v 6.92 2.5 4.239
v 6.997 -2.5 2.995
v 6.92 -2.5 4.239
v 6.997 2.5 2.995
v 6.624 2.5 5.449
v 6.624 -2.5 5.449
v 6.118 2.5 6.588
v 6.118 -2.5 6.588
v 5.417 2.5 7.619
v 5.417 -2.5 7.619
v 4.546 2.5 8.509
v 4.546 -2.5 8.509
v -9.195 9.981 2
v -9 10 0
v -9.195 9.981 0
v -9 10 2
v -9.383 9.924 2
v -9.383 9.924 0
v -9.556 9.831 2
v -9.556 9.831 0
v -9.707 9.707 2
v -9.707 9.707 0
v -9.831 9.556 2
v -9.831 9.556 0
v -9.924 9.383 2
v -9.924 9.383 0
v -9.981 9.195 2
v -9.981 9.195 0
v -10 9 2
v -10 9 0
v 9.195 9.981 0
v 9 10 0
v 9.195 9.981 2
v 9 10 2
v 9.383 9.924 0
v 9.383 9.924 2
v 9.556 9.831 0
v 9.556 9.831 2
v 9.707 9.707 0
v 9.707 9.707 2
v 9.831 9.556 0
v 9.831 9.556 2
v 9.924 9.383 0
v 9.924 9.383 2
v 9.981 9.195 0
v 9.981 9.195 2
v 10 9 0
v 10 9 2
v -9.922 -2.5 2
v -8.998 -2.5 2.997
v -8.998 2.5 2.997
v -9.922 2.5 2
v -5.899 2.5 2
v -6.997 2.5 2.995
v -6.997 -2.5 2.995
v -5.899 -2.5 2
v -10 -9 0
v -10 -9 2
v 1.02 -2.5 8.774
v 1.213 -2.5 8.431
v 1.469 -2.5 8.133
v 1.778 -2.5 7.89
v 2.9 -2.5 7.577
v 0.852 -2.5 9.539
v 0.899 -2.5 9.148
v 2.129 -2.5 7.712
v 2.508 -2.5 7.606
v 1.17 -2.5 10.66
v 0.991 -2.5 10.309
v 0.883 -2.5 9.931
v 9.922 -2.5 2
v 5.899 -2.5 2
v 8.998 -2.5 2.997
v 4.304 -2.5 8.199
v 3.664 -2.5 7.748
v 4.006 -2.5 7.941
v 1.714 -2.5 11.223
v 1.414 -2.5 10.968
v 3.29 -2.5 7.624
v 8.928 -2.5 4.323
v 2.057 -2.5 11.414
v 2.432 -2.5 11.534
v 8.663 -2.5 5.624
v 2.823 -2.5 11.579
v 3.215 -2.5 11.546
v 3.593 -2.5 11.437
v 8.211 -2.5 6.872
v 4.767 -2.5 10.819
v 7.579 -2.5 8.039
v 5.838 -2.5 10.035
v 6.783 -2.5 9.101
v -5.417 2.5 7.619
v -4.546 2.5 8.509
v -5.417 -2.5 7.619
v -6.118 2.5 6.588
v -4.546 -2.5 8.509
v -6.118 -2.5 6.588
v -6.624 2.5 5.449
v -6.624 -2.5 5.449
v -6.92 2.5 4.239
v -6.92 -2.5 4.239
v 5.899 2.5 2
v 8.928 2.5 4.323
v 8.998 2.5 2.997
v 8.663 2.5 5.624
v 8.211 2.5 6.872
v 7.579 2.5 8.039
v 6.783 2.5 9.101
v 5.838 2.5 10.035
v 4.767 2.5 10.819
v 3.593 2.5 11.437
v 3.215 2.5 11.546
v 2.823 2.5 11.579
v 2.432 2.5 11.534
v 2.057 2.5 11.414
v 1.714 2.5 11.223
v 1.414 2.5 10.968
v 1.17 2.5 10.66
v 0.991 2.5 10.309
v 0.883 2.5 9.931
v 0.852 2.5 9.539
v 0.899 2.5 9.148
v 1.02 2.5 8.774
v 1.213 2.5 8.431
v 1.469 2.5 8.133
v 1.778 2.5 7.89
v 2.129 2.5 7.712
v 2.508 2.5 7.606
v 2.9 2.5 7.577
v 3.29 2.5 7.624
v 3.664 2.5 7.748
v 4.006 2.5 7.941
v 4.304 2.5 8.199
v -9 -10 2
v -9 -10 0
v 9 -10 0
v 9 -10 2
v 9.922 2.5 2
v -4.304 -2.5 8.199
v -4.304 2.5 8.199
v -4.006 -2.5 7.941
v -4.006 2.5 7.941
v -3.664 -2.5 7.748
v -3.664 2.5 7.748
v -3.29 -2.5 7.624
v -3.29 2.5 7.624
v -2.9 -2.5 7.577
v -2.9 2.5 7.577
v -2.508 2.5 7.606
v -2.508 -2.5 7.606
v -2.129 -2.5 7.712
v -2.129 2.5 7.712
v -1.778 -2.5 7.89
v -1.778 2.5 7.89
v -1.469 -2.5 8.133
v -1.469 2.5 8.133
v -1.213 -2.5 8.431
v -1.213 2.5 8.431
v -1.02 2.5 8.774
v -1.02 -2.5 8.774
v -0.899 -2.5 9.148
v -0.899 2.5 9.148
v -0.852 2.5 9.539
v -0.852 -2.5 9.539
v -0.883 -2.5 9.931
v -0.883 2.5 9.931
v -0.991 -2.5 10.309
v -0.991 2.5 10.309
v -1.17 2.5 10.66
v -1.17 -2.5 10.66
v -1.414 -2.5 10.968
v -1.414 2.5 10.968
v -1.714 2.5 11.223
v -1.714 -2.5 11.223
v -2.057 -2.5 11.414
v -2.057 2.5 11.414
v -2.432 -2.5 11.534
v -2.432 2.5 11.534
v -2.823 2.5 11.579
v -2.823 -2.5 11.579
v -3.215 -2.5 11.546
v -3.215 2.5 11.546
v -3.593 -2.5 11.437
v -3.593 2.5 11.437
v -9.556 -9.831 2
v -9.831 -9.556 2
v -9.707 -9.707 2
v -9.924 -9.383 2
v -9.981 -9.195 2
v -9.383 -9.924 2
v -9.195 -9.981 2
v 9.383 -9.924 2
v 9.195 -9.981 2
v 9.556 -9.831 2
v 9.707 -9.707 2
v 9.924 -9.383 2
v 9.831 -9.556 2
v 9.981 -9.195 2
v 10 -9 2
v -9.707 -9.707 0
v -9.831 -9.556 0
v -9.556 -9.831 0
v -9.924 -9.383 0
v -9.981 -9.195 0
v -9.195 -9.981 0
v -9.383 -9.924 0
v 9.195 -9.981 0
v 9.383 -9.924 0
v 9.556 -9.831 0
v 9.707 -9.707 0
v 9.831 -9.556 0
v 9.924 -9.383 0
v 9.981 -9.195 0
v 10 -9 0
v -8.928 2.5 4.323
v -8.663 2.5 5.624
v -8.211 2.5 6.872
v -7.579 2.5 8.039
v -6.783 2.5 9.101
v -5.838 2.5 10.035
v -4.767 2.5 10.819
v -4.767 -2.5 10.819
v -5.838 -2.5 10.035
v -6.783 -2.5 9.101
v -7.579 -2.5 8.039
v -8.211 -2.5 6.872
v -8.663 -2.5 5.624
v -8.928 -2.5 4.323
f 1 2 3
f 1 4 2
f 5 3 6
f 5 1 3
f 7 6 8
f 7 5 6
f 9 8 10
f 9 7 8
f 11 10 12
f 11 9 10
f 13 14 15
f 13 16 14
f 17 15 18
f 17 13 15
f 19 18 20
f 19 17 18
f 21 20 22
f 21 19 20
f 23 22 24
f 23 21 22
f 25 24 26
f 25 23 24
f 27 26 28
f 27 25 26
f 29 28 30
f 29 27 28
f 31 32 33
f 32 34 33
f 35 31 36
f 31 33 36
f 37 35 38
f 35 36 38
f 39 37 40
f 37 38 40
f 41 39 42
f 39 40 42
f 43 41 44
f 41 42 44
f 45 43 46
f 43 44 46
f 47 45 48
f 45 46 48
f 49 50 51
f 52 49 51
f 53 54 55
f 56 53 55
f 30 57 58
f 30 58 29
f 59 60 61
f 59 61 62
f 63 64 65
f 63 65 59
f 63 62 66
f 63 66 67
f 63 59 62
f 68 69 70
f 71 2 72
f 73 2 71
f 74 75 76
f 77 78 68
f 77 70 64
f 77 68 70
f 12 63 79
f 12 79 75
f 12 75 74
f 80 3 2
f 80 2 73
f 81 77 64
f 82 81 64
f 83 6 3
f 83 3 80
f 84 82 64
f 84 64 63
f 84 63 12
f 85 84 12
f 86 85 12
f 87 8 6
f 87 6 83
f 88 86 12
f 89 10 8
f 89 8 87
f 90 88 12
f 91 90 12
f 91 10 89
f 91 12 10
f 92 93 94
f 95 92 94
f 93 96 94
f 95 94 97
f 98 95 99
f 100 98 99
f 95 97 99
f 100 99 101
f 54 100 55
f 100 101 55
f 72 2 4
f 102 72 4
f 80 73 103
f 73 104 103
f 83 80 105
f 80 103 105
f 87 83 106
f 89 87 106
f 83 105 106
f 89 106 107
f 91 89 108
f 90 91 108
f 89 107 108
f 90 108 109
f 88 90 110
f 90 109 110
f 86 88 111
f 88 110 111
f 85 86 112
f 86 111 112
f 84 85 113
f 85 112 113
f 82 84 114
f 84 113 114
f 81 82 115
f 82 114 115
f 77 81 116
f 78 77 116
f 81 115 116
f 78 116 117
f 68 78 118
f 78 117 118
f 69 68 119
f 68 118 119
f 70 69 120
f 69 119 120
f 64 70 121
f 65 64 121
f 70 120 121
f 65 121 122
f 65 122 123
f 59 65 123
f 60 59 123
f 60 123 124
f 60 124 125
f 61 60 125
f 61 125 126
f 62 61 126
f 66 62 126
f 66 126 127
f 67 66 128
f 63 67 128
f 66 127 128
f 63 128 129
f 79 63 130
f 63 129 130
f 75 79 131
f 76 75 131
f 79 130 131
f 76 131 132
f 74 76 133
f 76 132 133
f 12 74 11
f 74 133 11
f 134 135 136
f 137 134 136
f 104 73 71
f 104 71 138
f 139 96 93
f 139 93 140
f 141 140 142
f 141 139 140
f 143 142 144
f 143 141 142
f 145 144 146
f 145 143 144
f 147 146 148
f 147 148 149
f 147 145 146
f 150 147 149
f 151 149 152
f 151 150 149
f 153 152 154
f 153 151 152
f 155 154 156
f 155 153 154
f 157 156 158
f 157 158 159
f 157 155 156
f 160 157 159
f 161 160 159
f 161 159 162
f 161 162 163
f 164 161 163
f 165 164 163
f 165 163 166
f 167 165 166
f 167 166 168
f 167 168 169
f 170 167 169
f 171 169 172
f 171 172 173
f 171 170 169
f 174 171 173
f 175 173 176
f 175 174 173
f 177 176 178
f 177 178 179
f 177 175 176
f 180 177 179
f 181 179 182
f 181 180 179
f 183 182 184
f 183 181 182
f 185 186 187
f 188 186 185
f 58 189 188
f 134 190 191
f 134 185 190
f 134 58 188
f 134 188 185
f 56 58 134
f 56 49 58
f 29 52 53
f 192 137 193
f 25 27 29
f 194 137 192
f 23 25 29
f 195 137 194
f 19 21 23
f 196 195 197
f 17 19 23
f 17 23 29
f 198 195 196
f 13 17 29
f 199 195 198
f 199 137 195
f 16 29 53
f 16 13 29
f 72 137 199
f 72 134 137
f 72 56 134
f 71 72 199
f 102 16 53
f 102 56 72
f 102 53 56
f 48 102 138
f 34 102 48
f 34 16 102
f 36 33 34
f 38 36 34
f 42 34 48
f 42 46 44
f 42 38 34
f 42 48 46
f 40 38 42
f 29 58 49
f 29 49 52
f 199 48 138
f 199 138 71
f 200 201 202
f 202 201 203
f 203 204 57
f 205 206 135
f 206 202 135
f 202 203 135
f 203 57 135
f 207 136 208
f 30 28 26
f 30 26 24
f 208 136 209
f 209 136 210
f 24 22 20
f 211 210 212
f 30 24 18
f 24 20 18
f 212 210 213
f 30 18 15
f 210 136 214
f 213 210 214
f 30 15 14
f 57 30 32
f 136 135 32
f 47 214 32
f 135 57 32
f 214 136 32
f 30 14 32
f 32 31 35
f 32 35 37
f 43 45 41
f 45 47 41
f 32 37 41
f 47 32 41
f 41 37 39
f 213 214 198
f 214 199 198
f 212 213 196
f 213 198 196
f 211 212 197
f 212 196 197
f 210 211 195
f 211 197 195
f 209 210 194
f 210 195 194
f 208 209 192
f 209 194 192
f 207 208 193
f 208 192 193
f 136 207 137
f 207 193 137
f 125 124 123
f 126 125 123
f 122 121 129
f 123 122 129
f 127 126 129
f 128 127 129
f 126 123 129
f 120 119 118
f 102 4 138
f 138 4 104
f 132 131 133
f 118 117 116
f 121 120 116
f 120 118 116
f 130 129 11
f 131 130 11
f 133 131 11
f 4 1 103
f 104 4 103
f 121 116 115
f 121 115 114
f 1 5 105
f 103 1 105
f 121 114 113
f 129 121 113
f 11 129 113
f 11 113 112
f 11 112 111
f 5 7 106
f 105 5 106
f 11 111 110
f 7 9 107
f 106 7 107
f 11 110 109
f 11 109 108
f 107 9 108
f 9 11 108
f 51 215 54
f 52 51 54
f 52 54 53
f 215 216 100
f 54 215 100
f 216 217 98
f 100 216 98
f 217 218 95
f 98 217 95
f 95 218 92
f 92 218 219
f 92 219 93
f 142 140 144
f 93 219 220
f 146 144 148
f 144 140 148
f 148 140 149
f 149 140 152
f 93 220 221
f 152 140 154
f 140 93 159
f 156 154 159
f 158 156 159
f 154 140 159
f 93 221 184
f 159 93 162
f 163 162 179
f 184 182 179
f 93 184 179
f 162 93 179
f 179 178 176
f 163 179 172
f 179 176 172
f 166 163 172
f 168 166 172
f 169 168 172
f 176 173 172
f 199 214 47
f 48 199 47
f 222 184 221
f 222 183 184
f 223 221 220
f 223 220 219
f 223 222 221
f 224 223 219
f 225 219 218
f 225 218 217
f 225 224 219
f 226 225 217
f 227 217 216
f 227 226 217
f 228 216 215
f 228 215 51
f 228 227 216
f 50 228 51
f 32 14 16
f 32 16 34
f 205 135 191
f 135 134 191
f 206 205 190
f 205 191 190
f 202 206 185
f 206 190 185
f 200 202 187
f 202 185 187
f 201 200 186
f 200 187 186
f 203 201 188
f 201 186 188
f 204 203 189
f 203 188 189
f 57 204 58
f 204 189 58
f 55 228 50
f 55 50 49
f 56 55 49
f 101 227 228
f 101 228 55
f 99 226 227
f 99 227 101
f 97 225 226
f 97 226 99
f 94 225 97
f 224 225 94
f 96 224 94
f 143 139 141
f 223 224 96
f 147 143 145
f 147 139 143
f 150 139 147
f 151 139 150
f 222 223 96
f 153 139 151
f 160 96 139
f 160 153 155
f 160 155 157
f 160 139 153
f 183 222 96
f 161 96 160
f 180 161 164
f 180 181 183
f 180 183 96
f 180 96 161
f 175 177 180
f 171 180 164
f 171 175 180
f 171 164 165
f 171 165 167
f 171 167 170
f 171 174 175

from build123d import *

# Parameters (mm, degrees)
SKETCH_W     = 20
SKETCH_H     = 20
PAD_DEPTH    = 2
PAD001_DEPTH = 2.5
CHAMFER_SIZE = 1
FILLET_R     = 1


with BuildPart() as part:
    # Sketch → Pad (new body)
    with BuildSketch(Plane.XY):
        Rectangle(SKETCH_W, SKETCH_H)
    extrude(amount=PAD_DEPTH)

    # Sketch001 → Pad001 (join, symmetric)
    with BuildSketch(Plane.XZ):
        with BuildLine():
            ThreePointArc((8.921584, 2), (7.836918, 7.610703), (3.592669, 11.437298))
            ThreePointArc((3.592669, 11.437298), (0.950236, 8.958289), (4.545503, 8.508849))
            ThreePointArc((6.898889, 2), (6.582918, 5.565633), (4.545503, 8.508849))
            Line((6.898889, 2), (8.921584, 2))
        make_face()
        with BuildLine():
            Line((-8.921584, 2), (-6.898889, 2))
            ThreePointArc((-4.545503, 8.508849), (-6.582918, 5.565633), (-6.898889, 2))
            ThreePointArc((-4.545503, 8.508849), (-0.950236, 8.958289), (-3.592669, 11.437298))
            ThreePointArc((-3.592669, 11.437298), (-7.836918, 7.610703), (-8.921584, 2))
        make_face()
    extrude(amount=PAD001_DEPTH, both=True)

    # Chamfer
    chamfer_edges = [part.edges().sort_by_distance(p)[0] for p in [
        (-6.898889, 0, 2),
        (8.921584, 0, 2),
        (-8.921584, 0, 2),
        (6.898889, 0, 2),
    ]]
    chamfer(chamfer_edges, length=CHAMFER_SIZE)

    # Fillet
    fillet_edges = [part.edges().sort_by_distance(p)[0] for p in [
        (10, -10, 1),
        (10, 10, 1),
        (-10, -10, 1),
        (-10, 10, 1),
    ]]
    fillet(fillet_edges, radius=FILLET_R)


solid = part.part
